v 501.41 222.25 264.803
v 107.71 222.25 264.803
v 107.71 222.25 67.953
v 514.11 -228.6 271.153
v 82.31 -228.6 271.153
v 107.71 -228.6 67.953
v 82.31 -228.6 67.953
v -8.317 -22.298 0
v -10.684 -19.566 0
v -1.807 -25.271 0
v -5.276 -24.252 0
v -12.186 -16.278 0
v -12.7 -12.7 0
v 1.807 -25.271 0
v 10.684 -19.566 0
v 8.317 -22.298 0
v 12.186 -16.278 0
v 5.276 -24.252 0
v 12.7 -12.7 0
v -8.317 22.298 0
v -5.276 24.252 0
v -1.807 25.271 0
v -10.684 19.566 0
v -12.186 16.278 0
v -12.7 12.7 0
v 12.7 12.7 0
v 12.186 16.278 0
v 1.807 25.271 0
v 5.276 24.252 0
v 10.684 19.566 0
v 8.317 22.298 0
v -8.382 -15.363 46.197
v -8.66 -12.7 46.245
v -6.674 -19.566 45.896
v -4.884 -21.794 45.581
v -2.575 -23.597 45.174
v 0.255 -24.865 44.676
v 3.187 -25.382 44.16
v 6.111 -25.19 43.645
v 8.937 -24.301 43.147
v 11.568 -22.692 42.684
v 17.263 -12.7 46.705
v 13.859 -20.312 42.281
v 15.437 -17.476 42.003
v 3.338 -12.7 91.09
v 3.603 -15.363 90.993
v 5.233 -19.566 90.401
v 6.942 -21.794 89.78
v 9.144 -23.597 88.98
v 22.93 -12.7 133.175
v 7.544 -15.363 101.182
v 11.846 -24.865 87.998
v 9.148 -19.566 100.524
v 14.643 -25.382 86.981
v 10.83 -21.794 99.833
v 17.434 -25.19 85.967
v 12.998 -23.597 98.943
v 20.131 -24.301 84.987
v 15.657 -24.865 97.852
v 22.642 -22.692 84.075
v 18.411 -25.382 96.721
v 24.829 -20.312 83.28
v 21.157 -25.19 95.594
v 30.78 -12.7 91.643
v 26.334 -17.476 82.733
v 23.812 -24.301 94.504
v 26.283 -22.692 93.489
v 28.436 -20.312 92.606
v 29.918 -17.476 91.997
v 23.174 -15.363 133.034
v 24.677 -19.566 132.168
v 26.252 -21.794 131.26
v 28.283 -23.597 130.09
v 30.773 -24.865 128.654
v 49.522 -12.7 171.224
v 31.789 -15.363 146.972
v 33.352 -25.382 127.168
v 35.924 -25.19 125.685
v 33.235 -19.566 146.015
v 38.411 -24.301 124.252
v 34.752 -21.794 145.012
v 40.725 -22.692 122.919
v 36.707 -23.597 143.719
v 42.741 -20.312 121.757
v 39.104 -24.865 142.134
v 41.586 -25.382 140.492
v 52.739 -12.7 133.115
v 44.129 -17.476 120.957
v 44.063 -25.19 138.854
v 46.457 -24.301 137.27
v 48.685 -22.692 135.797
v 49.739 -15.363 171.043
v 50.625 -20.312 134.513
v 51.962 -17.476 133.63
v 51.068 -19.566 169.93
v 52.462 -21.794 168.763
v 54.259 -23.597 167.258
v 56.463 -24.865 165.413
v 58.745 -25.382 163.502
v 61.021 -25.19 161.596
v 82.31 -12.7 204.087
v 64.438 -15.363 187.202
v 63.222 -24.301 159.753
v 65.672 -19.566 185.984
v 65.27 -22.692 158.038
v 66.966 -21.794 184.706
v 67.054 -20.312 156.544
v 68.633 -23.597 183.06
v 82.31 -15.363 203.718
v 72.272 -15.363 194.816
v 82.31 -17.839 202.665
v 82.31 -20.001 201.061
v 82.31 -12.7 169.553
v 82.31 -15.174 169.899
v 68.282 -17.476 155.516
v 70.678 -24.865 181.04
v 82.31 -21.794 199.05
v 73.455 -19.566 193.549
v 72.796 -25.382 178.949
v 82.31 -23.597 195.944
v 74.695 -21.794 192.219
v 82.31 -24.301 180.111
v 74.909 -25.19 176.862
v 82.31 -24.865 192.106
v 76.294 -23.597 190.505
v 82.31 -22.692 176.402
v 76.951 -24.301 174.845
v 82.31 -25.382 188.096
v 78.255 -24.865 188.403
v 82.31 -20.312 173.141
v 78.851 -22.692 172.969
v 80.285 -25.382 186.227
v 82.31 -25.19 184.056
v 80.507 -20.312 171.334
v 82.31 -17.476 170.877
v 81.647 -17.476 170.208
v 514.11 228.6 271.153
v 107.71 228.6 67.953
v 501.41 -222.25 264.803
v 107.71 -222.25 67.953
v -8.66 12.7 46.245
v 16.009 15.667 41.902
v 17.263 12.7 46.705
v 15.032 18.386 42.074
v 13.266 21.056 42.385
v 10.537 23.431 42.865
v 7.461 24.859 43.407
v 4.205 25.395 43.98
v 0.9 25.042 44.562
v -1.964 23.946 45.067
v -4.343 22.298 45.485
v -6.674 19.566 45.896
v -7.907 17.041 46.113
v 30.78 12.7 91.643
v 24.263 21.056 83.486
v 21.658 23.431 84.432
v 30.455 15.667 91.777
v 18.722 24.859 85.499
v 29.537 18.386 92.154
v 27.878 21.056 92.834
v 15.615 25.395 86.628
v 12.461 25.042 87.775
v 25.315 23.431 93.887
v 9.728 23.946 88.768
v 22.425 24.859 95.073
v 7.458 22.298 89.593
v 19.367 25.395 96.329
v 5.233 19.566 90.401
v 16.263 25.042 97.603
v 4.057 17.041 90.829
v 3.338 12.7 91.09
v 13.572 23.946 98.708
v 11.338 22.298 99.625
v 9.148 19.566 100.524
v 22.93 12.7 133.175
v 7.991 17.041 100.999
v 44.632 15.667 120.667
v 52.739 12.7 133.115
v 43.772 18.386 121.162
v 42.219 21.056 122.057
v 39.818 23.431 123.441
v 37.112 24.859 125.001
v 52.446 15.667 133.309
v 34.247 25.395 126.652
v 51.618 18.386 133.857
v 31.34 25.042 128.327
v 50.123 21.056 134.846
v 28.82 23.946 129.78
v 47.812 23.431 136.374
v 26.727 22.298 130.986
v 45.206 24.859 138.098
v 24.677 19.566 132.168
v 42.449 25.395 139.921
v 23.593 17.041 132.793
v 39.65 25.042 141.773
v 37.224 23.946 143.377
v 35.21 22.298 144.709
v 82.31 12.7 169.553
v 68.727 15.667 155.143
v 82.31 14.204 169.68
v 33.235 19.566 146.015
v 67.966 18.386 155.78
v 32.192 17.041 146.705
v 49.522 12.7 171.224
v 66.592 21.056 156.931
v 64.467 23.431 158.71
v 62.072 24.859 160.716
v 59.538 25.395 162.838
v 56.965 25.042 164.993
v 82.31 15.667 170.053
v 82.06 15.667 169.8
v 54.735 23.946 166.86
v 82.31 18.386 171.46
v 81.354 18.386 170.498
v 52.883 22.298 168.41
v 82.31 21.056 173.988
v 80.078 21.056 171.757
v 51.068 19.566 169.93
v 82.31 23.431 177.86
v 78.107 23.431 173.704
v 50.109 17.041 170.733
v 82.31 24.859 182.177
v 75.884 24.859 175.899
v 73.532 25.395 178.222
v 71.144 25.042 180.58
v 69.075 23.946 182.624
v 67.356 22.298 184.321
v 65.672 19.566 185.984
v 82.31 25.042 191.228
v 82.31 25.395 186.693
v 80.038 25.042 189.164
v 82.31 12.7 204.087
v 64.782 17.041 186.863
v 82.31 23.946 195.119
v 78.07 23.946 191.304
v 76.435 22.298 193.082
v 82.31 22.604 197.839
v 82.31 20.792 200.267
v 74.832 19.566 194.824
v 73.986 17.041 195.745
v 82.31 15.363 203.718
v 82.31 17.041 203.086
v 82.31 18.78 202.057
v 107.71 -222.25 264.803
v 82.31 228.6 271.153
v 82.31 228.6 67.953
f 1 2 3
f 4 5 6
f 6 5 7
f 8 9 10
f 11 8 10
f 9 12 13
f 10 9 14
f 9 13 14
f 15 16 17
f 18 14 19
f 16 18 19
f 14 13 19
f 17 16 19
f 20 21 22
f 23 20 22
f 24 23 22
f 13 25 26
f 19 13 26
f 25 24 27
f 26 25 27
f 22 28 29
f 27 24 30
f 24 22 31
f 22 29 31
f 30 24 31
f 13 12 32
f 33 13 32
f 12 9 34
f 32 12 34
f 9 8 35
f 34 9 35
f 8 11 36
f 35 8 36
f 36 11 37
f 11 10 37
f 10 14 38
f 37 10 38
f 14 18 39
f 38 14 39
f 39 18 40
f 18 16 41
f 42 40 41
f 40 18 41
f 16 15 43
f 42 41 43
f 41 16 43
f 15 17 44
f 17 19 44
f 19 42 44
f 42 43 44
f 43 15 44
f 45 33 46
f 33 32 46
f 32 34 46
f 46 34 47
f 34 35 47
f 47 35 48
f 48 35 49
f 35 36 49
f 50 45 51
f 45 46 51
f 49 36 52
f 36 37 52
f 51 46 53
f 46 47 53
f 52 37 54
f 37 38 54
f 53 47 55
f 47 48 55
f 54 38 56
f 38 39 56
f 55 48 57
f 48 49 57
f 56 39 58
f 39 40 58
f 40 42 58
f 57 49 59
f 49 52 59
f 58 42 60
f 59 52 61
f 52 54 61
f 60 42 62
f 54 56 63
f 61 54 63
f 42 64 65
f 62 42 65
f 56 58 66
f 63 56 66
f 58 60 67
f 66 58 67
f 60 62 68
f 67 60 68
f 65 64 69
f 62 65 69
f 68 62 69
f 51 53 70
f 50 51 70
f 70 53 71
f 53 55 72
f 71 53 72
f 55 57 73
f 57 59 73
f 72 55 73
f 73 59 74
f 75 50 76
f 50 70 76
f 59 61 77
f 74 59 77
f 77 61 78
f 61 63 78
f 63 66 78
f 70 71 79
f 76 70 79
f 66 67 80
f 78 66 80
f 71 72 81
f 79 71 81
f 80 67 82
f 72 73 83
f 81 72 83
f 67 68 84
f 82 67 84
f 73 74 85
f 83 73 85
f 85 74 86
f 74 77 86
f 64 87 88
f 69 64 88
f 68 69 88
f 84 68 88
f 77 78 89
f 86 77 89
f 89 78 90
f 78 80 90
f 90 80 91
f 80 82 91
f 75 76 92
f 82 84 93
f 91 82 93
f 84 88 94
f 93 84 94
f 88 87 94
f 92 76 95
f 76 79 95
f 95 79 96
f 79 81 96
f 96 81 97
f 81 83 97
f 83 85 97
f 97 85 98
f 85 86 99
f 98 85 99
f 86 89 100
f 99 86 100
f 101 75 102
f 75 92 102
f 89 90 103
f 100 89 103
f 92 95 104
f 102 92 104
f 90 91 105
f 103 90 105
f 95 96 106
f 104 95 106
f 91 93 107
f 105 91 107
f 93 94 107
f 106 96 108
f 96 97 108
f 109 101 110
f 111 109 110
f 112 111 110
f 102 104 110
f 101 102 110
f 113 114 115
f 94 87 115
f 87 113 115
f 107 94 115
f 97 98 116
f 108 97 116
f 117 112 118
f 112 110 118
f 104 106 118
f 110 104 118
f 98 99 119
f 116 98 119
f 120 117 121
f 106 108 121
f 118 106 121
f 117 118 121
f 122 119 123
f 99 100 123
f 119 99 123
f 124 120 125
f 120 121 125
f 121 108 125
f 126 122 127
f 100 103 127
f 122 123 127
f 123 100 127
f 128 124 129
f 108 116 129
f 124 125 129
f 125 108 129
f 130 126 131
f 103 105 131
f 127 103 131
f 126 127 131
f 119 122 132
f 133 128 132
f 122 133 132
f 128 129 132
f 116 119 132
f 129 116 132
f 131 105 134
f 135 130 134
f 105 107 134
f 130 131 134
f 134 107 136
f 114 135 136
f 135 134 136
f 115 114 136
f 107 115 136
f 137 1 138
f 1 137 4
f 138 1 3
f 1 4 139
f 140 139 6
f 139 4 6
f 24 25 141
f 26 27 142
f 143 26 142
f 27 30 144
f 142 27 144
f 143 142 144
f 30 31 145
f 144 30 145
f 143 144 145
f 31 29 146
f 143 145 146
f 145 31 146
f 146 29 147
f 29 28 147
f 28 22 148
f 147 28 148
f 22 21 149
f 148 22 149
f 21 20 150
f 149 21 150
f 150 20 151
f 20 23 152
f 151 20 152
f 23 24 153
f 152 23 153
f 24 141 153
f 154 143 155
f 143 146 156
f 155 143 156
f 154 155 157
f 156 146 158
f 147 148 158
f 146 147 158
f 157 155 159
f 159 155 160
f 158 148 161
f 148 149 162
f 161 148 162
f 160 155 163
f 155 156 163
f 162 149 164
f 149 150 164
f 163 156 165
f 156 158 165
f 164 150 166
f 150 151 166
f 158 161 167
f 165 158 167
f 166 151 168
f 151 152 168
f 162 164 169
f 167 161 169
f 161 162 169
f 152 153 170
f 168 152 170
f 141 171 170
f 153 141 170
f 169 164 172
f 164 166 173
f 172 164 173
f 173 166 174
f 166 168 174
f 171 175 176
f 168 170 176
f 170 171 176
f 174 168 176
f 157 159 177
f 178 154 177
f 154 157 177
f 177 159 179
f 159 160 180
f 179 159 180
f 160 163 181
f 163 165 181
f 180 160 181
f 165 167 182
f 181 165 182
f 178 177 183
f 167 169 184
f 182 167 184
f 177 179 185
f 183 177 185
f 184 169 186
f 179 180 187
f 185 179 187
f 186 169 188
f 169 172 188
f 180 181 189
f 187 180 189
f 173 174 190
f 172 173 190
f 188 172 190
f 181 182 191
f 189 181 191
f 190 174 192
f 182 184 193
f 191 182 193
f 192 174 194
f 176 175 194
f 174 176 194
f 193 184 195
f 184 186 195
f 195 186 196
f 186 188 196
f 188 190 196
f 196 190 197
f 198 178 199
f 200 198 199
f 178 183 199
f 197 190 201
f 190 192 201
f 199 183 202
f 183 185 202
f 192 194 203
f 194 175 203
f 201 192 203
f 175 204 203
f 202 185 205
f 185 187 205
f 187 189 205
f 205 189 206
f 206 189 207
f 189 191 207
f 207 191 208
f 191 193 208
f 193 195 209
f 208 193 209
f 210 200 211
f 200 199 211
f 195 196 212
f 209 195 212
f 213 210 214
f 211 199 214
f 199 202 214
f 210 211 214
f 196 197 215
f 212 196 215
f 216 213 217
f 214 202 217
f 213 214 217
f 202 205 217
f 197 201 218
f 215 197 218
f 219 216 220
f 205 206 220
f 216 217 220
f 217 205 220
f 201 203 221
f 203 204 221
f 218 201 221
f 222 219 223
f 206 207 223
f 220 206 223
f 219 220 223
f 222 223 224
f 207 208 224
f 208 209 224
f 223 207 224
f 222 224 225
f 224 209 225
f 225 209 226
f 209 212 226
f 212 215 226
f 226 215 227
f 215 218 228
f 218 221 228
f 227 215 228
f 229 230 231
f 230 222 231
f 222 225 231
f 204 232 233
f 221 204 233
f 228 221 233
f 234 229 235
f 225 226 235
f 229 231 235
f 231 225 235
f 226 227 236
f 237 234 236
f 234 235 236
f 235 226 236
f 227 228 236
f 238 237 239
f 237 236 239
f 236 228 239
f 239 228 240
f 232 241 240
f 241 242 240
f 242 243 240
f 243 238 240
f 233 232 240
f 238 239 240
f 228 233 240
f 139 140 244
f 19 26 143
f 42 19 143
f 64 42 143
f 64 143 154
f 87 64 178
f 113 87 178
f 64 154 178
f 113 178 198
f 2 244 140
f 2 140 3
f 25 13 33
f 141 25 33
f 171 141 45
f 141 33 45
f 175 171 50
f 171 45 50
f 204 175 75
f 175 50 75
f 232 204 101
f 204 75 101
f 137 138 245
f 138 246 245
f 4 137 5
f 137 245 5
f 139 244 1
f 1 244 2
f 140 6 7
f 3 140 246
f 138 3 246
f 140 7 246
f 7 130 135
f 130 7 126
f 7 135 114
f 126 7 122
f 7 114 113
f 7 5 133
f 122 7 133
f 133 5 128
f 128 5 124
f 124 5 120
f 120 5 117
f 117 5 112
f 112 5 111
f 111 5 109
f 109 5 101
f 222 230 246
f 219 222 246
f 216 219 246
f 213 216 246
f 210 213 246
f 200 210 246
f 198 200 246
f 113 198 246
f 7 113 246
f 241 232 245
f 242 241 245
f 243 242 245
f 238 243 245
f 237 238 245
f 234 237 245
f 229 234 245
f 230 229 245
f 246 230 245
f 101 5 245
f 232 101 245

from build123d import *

# Parameters (mm, degrees)
F1_ANGLE      = 50
F3_DEPTH      = 25.4
F3_DEPTH_BACK = 25.4
F4_W          = 457.2
F4_H          = 203.2
F5_DEPTH      = 25.4
F7_DEPTH      = 406.4
F9_DEPTH      = 457.2


# Not quite as in the source:
# - ends of sketch curves that miss each other by under 0.0002 mm in the source are joined


with BuildPart() as f1:
    # F0 (on Top) → F1 (revolve)
    with BuildSketch(Plane.XY):
        with BuildLine():
            Line((-12.7, 12.7), (12.7, 12.7))
            ThreePointArc((12.7, 12.7), (0, 25.4), (-12.7, 12.7))
        make_face()
        with BuildLine():
            ThreePointArc((0, 0), (8.9802561211, 3.7197438789), (12.7, 12.7))
            Line((12.7, 12.7), (-12.7, 12.7))
            ThreePointArc((-12.7, 12.7), (-8.9802561211, 3.7197438789), (0, 0))
        make_face()
        with BuildLine():
            ThreePointArc((0, 0), (-8.9802561211, 3.7197438789), (-12.7, 12.7))
            Line((-12.7, 12.7), (-12.7, -12.7))
            ThreePointArc((-12.7, -12.7), (-8.9802561211, -3.7197438789), (0, 0))
        make_face()
        with BuildLine():
            Line((-12.7, -12.7), (12.7, -12.7))
            ThreePointArc((12.7, -12.7), (8.9802561211, -3.7197438789), (0, 0))
            ThreePointArc((0, 0), (-8.9802561211, -3.7197438789), (-12.7, -12.7))
        make_face()
        with BuildLine():
            ThreePointArc((-12.7, -12.7), (0, -25.4), (12.7, -12.7))
            Line((12.7, -12.7), (-12.7, -12.7))
        make_face()
        with BuildLine():
            Line((12.7, -12.7), (12.7, 12.7))
            ThreePointArc((12.7, 12.7), (8.9802561211, 3.7197438789), (0, 0))
            ThreePointArc((0, 0), (8.9802561211, -3.7197438789), (12.7, -12.7))
        make_face()
    revolve(axis=Axis((254, -3.8792621344, 0), (0, 1, 0)), revolution_arc=F1_ANGLE)

    # F2 (on Front) → F3 (cut, two sides)
    with BuildSketch(Plane.XZ) as f3_sk:
        Polygon((106.0351878405, 182.2580546141), (82.3100507259, 209.7299993038), (82.3100507259, 161.4786684513), align=None)
    extrude(amount=-F3_DEPTH, mode=Mode.SUBTRACT)
    extrude(f3_sk.sketch, amount=F3_DEPTH_BACK, mode=Mode.SUBTRACT)

    # F4 (on face) → F5 (join)
    with BuildSketch(Plane.YZ.offset(82.3100507259)):
        with Locations((0, 169.5530929186)):
            Rectangle(F4_W, F4_H)
        with BuildLine():
            Line((-12.7, 204.086871989), (12.7000006, 204.086871989))
            add(Edge.make_bspline(
                [(12.7000006, 204.086871989), (13.4690296338, 204.086871989), (14.2384453449, 204.0158750527), (14.9994460853, 203.8737558758), (15.7447177383, 203.6632719315), (16.4681309148, 203.3887393276), (17.1646524297, 203.0556697533), (18.2503222123, 202.4273420372), (18.6582844029, 202.1633436545), (19.0533520587, 201.8798852777), (19.4349362062, 201.5784262784), (19.8026309726, 201.2603920692), (20.1561814277, 200.9271325062), (20.9269905431, 200.1382361762), (21.3353938255, 199.6740027948), (21.7204670532, 199.1897069539), (22.0822142472, 198.6876735203), (22.420802674, 198.1700063327), (22.736519166, 197.6385568319), (23.250732617, 196.6851036415), (23.4589370134, 196.2683997588), (23.6544895384, 195.8454671817), (23.8375468192, 195.4169412733), (24.0082694094, 194.9834055779), (24.1668189946, 194.5453907771), (24.4233058083, 193.7717167394), (24.5264910507, 193.4378114469), (24.6229782806, 193.1018618849), (24.7128315819, 192.7640616927), (24.7961121661, 192.424594033), (24.8728783731, 192.0836315915), (25.1207544658, 190.876832951), (25.2571036638, 190.0039240497), (25.3531616976, 189.1251020116), (25.4096294667, 188.2427019804), (25.4270499712, 187.3589101884), (25.4057980417, 186.4757661893), (25.2856985057, 184.7074291559), (25.1862372229, 183.8224674602), (25.0477555884, 182.9421748337), (24.8701470857, 182.0686660516), (24.6531262016, 181.2042555644), (24.396196314, 180.3514681207), (23.98936689, 179.2056925756), (23.8747515893, 178.9002604218), (23.7546244835, 178.5969213548), (23.628943781, 178.2958298606), (23.4976641834, 177.9971515263), (23.3607368855, 177.7010630394), (23.0340408205, 177.0292176497), (22.8404825612, 176.6553180497), (22.6373184094, 176.286450794), (22.4244302808, 175.923064433), (22.2016988546, 175.5656585526), (21.9690040336, 175.2147836652), (21.4216371496, 174.439784246), (21.1012037916, 174.0197923426), (20.7646717024, 173.6122217846), (20.411845386, 173.2184579323), (20.0426129089, 172.8400922025), (19.6569713302, 172.4788991587), (18.9525917336, 171.8793804305), (18.6409356563, 171.6327871636), (18.3201611387, 171.3978713881), (17.9904282668, 171.175545954), (17.6519935165, 170.9667789735), (17.3052290423, 170.7725645788), (16.3872564507, 170.30998109), (15.8037606781, 170.0651084693), (15.202749403, 169.8635860217), (14.5874722629, 169.7092428977), (13.9619040353, 169.6051183146), (13.3308265381, 169.5530929186), (12.7, 169.5530929186)],
                knots=[0.5057352072, 0.5057352072, 0.5057352072, 0.5057352072, 0.5057352072, 0.5057352072, 0.5057352072, 0.5057352072, 0.6195246246, 0.6195246246, 0.6195246246, 0.6195246246, 0.6195246246, 0.6195246246, 0.691331529, 0.691331529, 0.691331529, 0.691331529, 0.691331529, 0.691331529, 0.7826631285, 0.7826631285, 0.7826631285, 0.7826631285, 0.7826631285, 0.7826631285, 0.8515046919, 0.8515046919, 0.8515046919, 0.8515046919, 0.8515046919, 0.8515046919, 0.9031583009, 0.9031583009, 0.9031583009, 0.9031583009, 0.9031583009, 0.9031583009, 1.0336151594, 1.0336151594, 1.0336151594, 1.0336151594, 1.0336151594, 1.0336151594, 1.1651272693, 1.1651272693, 1.1651272693, 1.1651272693, 1.1651272693, 1.1651272693, 1.2133438014, 1.2133438014, 1.2133438014, 1.2133438014, 1.2133438014, 1.2133438014, 1.275570012, 1.275570012, 1.275570012, 1.275570012, 1.275570012, 1.275570012, 1.3536385506, 1.3536385506, 1.3536385506, 1.3536385506, 1.3536385506, 1.3536385506, 1.412388273, 1.412388273, 1.412388273, 1.412388273, 1.412388273, 1.412388273, 1.5057352072, 1.5057352072, 1.5057352072, 1.5057352072, 1.5057352072, 1.5057352072, 1.5057352072, 1.5057352072], degree=7))
            Line((12.7, 169.5530929186), (-12.7000006, 169.5530929186))
            add(Edge.make_bspline(
                [(-12.7, 204.086871989), (-13.4706419927, 204.086871989), (-14.2416727155, 204.0155770292), (-15.0042333997, 203.8728607028), (-15.750966819, 203.6615047617), (-16.4757112201, 203.385859421), (-17.1734108274, 203.0514773721), (-18.2599454854, 202.421209965), (-18.6677421137, 202.1567547593), (-19.0626276136, 201.8728554308), (-19.4440153557, 201.5709719561), (-19.8115015564, 201.2525298833), (-20.1648331318, 200.9188788331), (-20.9351284745, 200.129125636), (-21.3432310697, 199.664436441), (-21.7279921591, 199.179709209), (-22.0894180876, 198.677267534), (-22.4276778241, 198.1592138164), (-22.7430593956, 197.6273980388), (-23.2566674815, 196.6733514115), (-23.4646047683, 196.2564127529), (-23.659888404, 195.8332560761), (-23.8426752316, 195.4045161634), (-24.0131259335, 194.9707760325), (-24.1714022488, 194.5325659004), (-24.4274032953, 193.7585803928), (-24.5303772724, 193.4245553586), (-24.626653065, 193.0884909648), (-24.7162947319, 192.7505806742), (-24.7993634474, 192.4110074931), (-24.8759175013, 192.0699439709), (-25.1230295402, 190.8628768117), (-25.2588319682, 189.9898251152), (-25.3543467105, 189.1108867647), (-25.4102732079, 188.2283952031), (-25.4271528417, 187.3445356956), (-25.4053586427, 186.4613475677), (-25.2841715299, 184.6930901591), (-25.184175573, 183.8082519745), (-25.0451643421, 182.9281062846), (-24.8670292224, 182.0547683599), (-24.6494826959, 181.1905540646), (-24.39202618, 180.337990515), (-23.9844834065, 179.1925931098), (-23.8696850934, 178.8872878707), (-23.7493755543, 178.584079685), (-23.6235129254, 178.2831232001), (-23.4920518465, 177.984584189), (-23.3549434604, 177.6886395502), (-23.0278434233, 177.0171551156), (-22.8340635577, 176.6434752959), (-22.630679354, 176.274835687), (-22.4175727111, 175.9116853585), (-22.1946243635, 175.5545244929), (-21.9617143535, 175.2039042681), (-21.413881263, 174.4295229159), (-21.0931995505, 174.009899279), (-20.7564242688, 173.6027135171), (-20.4033607941, 173.2093524612), (-20.0338985268, 172.8314090197), (-19.6480364418, 172.4706591125), (-18.9432894603, 171.8719538781), (-18.6314812112, 171.6257215316), (-18.3105623463, 171.3911796656), (-17.9806943678, 171.1692413992), (-17.6421353749, 170.9608748132), (-17.2952593711, 170.7670736149), (-16.3783249615, 170.3062381426), (-15.7960954678, 170.0625416452), (-15.196471078, 169.8620129232), (-14.5826838746, 169.7084467911), (-13.9586833556, 169.6048532006), (-13.3292171931, 169.5530929186), (-12.7000006, 169.5530929186)],
                knots=[0, 0, 0, 0, 0, 0, 0, 0, 0.1140276778, 0.1140276778, 0.1140276778, 0.1140276778, 0.1140276778, 0.1140276778, 0.1858507541, 0.1858507541, 0.1858507541, 0.1858507541, 0.1858507541, 0.1858507541, 0.2772036221, 0.2772036221, 0.2772036221, 0.2772036221, 0.2772036221, 0.2772036221, 0.3460585734, 0.3460585734, 0.3460585734, 0.3460585734, 0.3460585734, 0.3460585734, 0.3977198641, 0.3977198641, 0.3977198641, 0.3977198641, 0.3977198641, 0.3977198641, 0.5281851685, 0.5281851685, 0.5281851685, 0.5281851685, 0.5281851685, 0.5281851685, 0.6596880543, 0.6596880543, 0.6596880543, 0.6596880543, 0.6596880543, 0.6596880543, 0.7078965646, 0.7078965646, 0.7078965646, 0.7078965646, 0.7078965646, 0.7078965646, 0.7701090416, 0.7701090416, 0.7701090416, 0.7701090416, 0.7701090416, 0.7701090416, 0.8481566341, 0.8481566341, 0.8481566341, 0.8481566341, 0.8481566341, 0.8481566341, 0.906890942, 0.906890942, 0.906890942, 0.906890942, 0.906890942, 0.906890942, 1, 1, 1, 1, 1, 1, 1, 1], degree=7))
        make_face(mode=Mode.SUBTRACT)
        with BuildLine():
            add(Edge.make_bspline(
                [(12.7, 204.086871989), (13.4690296338, 204.086871989), (14.2384453449, 204.0158750527), (14.9994460853, 203.8737558758), (15.7447177383, 203.6632719315), (16.4681309148, 203.3887393276), (17.1646524297, 203.0556697533), (18.2503222123, 202.4273420372), (18.6582844029, 202.1633436545), (19.0533520587, 201.8798852777), (19.4349362062, 201.5784262784), (19.8026309726, 201.2603920692), (20.1561814277, 200.9271325062), (20.9269905431, 200.1382361762), (21.3353938255, 199.6740027948), (21.7204670532, 199.1897069539), (22.0822142472, 198.6876735203), (22.420802674, 198.1700063327), (22.736519166, 197.6385568319), (23.250732617, 196.6851036415), (23.4589370134, 196.2683997588), (23.6544895384, 195.8454671817), (23.8375468192, 195.4169412733), (24.0082694094, 194.9834055779), (24.1668189946, 194.5453907771), (24.4233058083, 193.7717167394), (24.5264910507, 193.4378114469), (24.6229782806, 193.1018618849), (24.7128315819, 192.7640616927), (24.7961121661, 192.424594033), (24.8728783731, 192.0836315915), (25.1207544658, 190.876832951), (25.2571036638, 190.0039240497), (25.3531616976, 189.1251020116), (25.4096294667, 188.2427019804), (25.4270499712, 187.3589101884), (25.4057980417, 186.4757661893), (25.2856985057, 184.7074291559), (25.1862372229, 183.8224674602), (25.0477555884, 182.9421748337), (24.8701470857, 182.0686660516), (24.6531262016, 181.2042555644), (24.396196314, 180.3514681207), (23.98936689, 179.2056925756), (23.8747515893, 178.9002604218), (23.7546244835, 178.5969213548), (23.628943781, 178.2958298606), (23.4976641834, 177.9971515263), (23.3607368855, 177.7010630394), (23.0340408205, 177.0292176497), (22.8404825612, 176.6553180497), (22.6373184094, 176.286450794), (22.4244302808, 175.923064433), (22.2016988546, 175.5656585526), (21.9690040336, 175.2147836652), (21.4216371496, 174.439784246), (21.1012037916, 174.0197923426), (20.7646717024, 173.6122217846), (20.411845386, 173.2184579323), (20.0426129089, 172.8400922025), (19.6569713302, 172.4788991587), (18.9525917336, 171.8793804305), (18.6409356563, 171.6327871636), (18.3201611387, 171.3978713881), (17.9904282668, 171.175545954), (17.6519935165, 170.9667789735), (17.3052290423, 170.7725645788), (16.3872564507, 170.30998109), (15.8037606781, 170.0651084693), (15.202749403, 169.8635860217), (14.5874722629, 169.7092428977), (13.9619040353, 169.6051183146), (13.3308265381, 169.5530929186), (12.7, 169.5530929186)],
                knots=[0.5057352072, 0.5057352072, 0.5057352072, 0.5057352072, 0.5057352072, 0.5057352072, 0.5057352072, 0.5057352072, 0.6195246246, 0.6195246246, 0.6195246246, 0.6195246246, 0.6195246246, 0.6195246246, 0.691331529, 0.691331529, 0.691331529, 0.691331529, 0.691331529, 0.691331529, 0.7826631285, 0.7826631285, 0.7826631285, 0.7826631285, 0.7826631285, 0.7826631285, 0.8515046919, 0.8515046919, 0.8515046919, 0.8515046919, 0.8515046919, 0.8515046919, 0.9031583009, 0.9031583009, 0.9031583009, 0.9031583009, 0.9031583009, 0.9031583009, 1.0336151594, 1.0336151594, 1.0336151594, 1.0336151594, 1.0336151594, 1.0336151594, 1.1651272693, 1.1651272693, 1.1651272693, 1.1651272693, 1.1651272693, 1.1651272693, 1.2133438014, 1.2133438014, 1.2133438014, 1.2133438014, 1.2133438014, 1.2133438014, 1.275570012, 1.275570012, 1.275570012, 1.275570012, 1.275570012, 1.275570012, 1.3536385506, 1.3536385506, 1.3536385506, 1.3536385506, 1.3536385506, 1.3536385506, 1.412388273, 1.412388273, 1.412388273, 1.412388273, 1.412388273, 1.412388273, 1.5057352072, 1.5057352072, 1.5057352072, 1.5057352072, 1.5057352072, 1.5057352072, 1.5057352072, 1.5057352072], degree=7))
            Line((12.7, 204.086871989), (-12.7, 204.086871989))
            add(Edge.make_bspline(
                [(-12.7, 204.086871989), (-13.4706419927, 204.086871989), (-14.2416727155, 204.0155770292), (-15.0042333997, 203.8728607028), (-15.750966819, 203.6615047617), (-16.4757112201, 203.385859421), (-17.1734108274, 203.0514773721), (-18.2599454854, 202.421209965), (-18.6677421137, 202.1567547593), (-19.0626276136, 201.8728554308), (-19.4440153557, 201.5709719561), (-19.8115015564, 201.2525298833), (-20.1648331318, 200.9188788331), (-20.9351284745, 200.129125636), (-21.3432310697, 199.664436441), (-21.7279921591, 199.179709209), (-22.0894180876, 198.677267534), (-22.4276778241, 198.1592138164), (-22.7430593956, 197.6273980388), (-23.2566674815, 196.6733514115), (-23.4646047683, 196.2564127529), (-23.659888404, 195.8332560761), (-23.8426752316, 195.4045161634), (-24.0131259335, 194.9707760325), (-24.1714022488, 194.5325659004), (-24.4274032953, 193.7585803928), (-24.5303772724, 193.4245553586), (-24.626653065, 193.0884909648), (-24.7162947319, 192.7505806742), (-24.7993634474, 192.4110074931), (-24.8759175013, 192.0699439709), (-25.1230295402, 190.8628768117), (-25.2588319682, 189.9898251152), (-25.3543467105, 189.1108867647), (-25.4102732079, 188.2283952031), (-25.4271528417, 187.3445356956), (-25.4053586427, 186.4613475677), (-25.2841715299, 184.6930901591), (-25.184175573, 183.8082519745), (-25.0451643421, 182.9281062846), (-24.8670292224, 182.0547683599), (-24.6494826959, 181.1905540646), (-24.39202618, 180.337990515), (-23.9844834065, 179.1925931098), (-23.8696850934, 178.8872878707), (-23.7493755543, 178.584079685), (-23.6235129254, 178.2831232001), (-23.4920518465, 177.984584189), (-23.3549434604, 177.6886395502), (-23.0278434233, 177.0171551156), (-22.8340635577, 176.6434752959), (-22.630679354, 176.274835687), (-22.4175727111, 175.9116853585), (-22.1946243635, 175.5545244929), (-21.9617143535, 175.2039042681), (-21.413881263, 174.4295229159), (-21.0931995505, 174.009899279), (-20.7564242688, 173.6027135171), (-20.4033607941, 173.2093524612), (-20.0338985268, 172.8314090197), (-19.6480364418, 172.4706591125), (-18.9432894603, 171.8719538781), (-18.6314812112, 171.6257215316), (-18.3105623463, 171.3911796656), (-17.9806943678, 171.1692413992), (-17.6421353749, 170.9608748132), (-17.2952593711, 170.7670736149), (-16.3783249615, 170.3062381426), (-15.7960954678, 170.0625416452), (-15.196471078, 169.8620129232), (-14.5826838746, 169.7084467911), (-13.9586833556, 169.6048532006), (-13.3292171931, 169.5530929186), (-12.7, 169.5530929186)],
                knots=[0, 0, 0, 0, 0, 0, 0, 0, 0.1140276778, 0.1140276778, 0.1140276778, 0.1140276778, 0.1140276778, 0.1140276778, 0.1858507541, 0.1858507541, 0.1858507541, 0.1858507541, 0.1858507541, 0.1858507541, 0.2772036221, 0.2772036221, 0.2772036221, 0.2772036221, 0.2772036221, 0.2772036221, 0.3460585734, 0.3460585734, 0.3460585734, 0.3460585734, 0.3460585734, 0.3460585734, 0.3977198641, 0.3977198641, 0.3977198641, 0.3977198641, 0.3977198641, 0.3977198641, 0.5281851685, 0.5281851685, 0.5281851685, 0.5281851685, 0.5281851685, 0.5281851685, 0.6596880543, 0.6596880543, 0.6596880543, 0.6596880543, 0.6596880543, 0.6596880543, 0.7078965646, 0.7078965646, 0.7078965646, 0.7078965646, 0.7078965646, 0.7078965646, 0.7701090416, 0.7701090416, 0.7701090416, 0.7701090416, 0.7701090416, 0.7701090416, 0.8481566341, 0.8481566341, 0.8481566341, 0.8481566341, 0.8481566341, 0.8481566341, 0.906890942, 0.906890942, 0.906890942, 0.906890942, 0.906890942, 0.906890942, 1, 1, 1, 1, 1, 1, 1, 1], degree=7))
            Line((-12.7, 169.5530929186), (12.7, 169.5530929186))
        make_face()
    extrude(amount=F5_DEPTH)

    # F6 (on face) → F7 (join)
    with BuildSketch(Plane.YZ.offset(107.7100507259)):
        Polygon((-222.25, 67.9530929186), (-222.25, 264.8030929186), (222.25, 264.8030929186), (222.25, 67.9530929186), (228.6, 67.9530929186), (228.6, 271.1530929186), (-228.6, 271.1530929186), (-228.6, 67.9530929186), align=None)
    extrude(amount=F7_DEPTH)

    # F8 (on face) → F9 (cut)
    with BuildSketch(Plane.XZ.offset(228.6)):
        Polygon((514.1100507259, 271.1530929186), (107.7100507259, 67.9530929186), (514.1100507259, 67.9530929186), align=None)
    extrude(amount=-F9_DEPTH, mode=Mode.SUBTRACT)


solid = f1.part
